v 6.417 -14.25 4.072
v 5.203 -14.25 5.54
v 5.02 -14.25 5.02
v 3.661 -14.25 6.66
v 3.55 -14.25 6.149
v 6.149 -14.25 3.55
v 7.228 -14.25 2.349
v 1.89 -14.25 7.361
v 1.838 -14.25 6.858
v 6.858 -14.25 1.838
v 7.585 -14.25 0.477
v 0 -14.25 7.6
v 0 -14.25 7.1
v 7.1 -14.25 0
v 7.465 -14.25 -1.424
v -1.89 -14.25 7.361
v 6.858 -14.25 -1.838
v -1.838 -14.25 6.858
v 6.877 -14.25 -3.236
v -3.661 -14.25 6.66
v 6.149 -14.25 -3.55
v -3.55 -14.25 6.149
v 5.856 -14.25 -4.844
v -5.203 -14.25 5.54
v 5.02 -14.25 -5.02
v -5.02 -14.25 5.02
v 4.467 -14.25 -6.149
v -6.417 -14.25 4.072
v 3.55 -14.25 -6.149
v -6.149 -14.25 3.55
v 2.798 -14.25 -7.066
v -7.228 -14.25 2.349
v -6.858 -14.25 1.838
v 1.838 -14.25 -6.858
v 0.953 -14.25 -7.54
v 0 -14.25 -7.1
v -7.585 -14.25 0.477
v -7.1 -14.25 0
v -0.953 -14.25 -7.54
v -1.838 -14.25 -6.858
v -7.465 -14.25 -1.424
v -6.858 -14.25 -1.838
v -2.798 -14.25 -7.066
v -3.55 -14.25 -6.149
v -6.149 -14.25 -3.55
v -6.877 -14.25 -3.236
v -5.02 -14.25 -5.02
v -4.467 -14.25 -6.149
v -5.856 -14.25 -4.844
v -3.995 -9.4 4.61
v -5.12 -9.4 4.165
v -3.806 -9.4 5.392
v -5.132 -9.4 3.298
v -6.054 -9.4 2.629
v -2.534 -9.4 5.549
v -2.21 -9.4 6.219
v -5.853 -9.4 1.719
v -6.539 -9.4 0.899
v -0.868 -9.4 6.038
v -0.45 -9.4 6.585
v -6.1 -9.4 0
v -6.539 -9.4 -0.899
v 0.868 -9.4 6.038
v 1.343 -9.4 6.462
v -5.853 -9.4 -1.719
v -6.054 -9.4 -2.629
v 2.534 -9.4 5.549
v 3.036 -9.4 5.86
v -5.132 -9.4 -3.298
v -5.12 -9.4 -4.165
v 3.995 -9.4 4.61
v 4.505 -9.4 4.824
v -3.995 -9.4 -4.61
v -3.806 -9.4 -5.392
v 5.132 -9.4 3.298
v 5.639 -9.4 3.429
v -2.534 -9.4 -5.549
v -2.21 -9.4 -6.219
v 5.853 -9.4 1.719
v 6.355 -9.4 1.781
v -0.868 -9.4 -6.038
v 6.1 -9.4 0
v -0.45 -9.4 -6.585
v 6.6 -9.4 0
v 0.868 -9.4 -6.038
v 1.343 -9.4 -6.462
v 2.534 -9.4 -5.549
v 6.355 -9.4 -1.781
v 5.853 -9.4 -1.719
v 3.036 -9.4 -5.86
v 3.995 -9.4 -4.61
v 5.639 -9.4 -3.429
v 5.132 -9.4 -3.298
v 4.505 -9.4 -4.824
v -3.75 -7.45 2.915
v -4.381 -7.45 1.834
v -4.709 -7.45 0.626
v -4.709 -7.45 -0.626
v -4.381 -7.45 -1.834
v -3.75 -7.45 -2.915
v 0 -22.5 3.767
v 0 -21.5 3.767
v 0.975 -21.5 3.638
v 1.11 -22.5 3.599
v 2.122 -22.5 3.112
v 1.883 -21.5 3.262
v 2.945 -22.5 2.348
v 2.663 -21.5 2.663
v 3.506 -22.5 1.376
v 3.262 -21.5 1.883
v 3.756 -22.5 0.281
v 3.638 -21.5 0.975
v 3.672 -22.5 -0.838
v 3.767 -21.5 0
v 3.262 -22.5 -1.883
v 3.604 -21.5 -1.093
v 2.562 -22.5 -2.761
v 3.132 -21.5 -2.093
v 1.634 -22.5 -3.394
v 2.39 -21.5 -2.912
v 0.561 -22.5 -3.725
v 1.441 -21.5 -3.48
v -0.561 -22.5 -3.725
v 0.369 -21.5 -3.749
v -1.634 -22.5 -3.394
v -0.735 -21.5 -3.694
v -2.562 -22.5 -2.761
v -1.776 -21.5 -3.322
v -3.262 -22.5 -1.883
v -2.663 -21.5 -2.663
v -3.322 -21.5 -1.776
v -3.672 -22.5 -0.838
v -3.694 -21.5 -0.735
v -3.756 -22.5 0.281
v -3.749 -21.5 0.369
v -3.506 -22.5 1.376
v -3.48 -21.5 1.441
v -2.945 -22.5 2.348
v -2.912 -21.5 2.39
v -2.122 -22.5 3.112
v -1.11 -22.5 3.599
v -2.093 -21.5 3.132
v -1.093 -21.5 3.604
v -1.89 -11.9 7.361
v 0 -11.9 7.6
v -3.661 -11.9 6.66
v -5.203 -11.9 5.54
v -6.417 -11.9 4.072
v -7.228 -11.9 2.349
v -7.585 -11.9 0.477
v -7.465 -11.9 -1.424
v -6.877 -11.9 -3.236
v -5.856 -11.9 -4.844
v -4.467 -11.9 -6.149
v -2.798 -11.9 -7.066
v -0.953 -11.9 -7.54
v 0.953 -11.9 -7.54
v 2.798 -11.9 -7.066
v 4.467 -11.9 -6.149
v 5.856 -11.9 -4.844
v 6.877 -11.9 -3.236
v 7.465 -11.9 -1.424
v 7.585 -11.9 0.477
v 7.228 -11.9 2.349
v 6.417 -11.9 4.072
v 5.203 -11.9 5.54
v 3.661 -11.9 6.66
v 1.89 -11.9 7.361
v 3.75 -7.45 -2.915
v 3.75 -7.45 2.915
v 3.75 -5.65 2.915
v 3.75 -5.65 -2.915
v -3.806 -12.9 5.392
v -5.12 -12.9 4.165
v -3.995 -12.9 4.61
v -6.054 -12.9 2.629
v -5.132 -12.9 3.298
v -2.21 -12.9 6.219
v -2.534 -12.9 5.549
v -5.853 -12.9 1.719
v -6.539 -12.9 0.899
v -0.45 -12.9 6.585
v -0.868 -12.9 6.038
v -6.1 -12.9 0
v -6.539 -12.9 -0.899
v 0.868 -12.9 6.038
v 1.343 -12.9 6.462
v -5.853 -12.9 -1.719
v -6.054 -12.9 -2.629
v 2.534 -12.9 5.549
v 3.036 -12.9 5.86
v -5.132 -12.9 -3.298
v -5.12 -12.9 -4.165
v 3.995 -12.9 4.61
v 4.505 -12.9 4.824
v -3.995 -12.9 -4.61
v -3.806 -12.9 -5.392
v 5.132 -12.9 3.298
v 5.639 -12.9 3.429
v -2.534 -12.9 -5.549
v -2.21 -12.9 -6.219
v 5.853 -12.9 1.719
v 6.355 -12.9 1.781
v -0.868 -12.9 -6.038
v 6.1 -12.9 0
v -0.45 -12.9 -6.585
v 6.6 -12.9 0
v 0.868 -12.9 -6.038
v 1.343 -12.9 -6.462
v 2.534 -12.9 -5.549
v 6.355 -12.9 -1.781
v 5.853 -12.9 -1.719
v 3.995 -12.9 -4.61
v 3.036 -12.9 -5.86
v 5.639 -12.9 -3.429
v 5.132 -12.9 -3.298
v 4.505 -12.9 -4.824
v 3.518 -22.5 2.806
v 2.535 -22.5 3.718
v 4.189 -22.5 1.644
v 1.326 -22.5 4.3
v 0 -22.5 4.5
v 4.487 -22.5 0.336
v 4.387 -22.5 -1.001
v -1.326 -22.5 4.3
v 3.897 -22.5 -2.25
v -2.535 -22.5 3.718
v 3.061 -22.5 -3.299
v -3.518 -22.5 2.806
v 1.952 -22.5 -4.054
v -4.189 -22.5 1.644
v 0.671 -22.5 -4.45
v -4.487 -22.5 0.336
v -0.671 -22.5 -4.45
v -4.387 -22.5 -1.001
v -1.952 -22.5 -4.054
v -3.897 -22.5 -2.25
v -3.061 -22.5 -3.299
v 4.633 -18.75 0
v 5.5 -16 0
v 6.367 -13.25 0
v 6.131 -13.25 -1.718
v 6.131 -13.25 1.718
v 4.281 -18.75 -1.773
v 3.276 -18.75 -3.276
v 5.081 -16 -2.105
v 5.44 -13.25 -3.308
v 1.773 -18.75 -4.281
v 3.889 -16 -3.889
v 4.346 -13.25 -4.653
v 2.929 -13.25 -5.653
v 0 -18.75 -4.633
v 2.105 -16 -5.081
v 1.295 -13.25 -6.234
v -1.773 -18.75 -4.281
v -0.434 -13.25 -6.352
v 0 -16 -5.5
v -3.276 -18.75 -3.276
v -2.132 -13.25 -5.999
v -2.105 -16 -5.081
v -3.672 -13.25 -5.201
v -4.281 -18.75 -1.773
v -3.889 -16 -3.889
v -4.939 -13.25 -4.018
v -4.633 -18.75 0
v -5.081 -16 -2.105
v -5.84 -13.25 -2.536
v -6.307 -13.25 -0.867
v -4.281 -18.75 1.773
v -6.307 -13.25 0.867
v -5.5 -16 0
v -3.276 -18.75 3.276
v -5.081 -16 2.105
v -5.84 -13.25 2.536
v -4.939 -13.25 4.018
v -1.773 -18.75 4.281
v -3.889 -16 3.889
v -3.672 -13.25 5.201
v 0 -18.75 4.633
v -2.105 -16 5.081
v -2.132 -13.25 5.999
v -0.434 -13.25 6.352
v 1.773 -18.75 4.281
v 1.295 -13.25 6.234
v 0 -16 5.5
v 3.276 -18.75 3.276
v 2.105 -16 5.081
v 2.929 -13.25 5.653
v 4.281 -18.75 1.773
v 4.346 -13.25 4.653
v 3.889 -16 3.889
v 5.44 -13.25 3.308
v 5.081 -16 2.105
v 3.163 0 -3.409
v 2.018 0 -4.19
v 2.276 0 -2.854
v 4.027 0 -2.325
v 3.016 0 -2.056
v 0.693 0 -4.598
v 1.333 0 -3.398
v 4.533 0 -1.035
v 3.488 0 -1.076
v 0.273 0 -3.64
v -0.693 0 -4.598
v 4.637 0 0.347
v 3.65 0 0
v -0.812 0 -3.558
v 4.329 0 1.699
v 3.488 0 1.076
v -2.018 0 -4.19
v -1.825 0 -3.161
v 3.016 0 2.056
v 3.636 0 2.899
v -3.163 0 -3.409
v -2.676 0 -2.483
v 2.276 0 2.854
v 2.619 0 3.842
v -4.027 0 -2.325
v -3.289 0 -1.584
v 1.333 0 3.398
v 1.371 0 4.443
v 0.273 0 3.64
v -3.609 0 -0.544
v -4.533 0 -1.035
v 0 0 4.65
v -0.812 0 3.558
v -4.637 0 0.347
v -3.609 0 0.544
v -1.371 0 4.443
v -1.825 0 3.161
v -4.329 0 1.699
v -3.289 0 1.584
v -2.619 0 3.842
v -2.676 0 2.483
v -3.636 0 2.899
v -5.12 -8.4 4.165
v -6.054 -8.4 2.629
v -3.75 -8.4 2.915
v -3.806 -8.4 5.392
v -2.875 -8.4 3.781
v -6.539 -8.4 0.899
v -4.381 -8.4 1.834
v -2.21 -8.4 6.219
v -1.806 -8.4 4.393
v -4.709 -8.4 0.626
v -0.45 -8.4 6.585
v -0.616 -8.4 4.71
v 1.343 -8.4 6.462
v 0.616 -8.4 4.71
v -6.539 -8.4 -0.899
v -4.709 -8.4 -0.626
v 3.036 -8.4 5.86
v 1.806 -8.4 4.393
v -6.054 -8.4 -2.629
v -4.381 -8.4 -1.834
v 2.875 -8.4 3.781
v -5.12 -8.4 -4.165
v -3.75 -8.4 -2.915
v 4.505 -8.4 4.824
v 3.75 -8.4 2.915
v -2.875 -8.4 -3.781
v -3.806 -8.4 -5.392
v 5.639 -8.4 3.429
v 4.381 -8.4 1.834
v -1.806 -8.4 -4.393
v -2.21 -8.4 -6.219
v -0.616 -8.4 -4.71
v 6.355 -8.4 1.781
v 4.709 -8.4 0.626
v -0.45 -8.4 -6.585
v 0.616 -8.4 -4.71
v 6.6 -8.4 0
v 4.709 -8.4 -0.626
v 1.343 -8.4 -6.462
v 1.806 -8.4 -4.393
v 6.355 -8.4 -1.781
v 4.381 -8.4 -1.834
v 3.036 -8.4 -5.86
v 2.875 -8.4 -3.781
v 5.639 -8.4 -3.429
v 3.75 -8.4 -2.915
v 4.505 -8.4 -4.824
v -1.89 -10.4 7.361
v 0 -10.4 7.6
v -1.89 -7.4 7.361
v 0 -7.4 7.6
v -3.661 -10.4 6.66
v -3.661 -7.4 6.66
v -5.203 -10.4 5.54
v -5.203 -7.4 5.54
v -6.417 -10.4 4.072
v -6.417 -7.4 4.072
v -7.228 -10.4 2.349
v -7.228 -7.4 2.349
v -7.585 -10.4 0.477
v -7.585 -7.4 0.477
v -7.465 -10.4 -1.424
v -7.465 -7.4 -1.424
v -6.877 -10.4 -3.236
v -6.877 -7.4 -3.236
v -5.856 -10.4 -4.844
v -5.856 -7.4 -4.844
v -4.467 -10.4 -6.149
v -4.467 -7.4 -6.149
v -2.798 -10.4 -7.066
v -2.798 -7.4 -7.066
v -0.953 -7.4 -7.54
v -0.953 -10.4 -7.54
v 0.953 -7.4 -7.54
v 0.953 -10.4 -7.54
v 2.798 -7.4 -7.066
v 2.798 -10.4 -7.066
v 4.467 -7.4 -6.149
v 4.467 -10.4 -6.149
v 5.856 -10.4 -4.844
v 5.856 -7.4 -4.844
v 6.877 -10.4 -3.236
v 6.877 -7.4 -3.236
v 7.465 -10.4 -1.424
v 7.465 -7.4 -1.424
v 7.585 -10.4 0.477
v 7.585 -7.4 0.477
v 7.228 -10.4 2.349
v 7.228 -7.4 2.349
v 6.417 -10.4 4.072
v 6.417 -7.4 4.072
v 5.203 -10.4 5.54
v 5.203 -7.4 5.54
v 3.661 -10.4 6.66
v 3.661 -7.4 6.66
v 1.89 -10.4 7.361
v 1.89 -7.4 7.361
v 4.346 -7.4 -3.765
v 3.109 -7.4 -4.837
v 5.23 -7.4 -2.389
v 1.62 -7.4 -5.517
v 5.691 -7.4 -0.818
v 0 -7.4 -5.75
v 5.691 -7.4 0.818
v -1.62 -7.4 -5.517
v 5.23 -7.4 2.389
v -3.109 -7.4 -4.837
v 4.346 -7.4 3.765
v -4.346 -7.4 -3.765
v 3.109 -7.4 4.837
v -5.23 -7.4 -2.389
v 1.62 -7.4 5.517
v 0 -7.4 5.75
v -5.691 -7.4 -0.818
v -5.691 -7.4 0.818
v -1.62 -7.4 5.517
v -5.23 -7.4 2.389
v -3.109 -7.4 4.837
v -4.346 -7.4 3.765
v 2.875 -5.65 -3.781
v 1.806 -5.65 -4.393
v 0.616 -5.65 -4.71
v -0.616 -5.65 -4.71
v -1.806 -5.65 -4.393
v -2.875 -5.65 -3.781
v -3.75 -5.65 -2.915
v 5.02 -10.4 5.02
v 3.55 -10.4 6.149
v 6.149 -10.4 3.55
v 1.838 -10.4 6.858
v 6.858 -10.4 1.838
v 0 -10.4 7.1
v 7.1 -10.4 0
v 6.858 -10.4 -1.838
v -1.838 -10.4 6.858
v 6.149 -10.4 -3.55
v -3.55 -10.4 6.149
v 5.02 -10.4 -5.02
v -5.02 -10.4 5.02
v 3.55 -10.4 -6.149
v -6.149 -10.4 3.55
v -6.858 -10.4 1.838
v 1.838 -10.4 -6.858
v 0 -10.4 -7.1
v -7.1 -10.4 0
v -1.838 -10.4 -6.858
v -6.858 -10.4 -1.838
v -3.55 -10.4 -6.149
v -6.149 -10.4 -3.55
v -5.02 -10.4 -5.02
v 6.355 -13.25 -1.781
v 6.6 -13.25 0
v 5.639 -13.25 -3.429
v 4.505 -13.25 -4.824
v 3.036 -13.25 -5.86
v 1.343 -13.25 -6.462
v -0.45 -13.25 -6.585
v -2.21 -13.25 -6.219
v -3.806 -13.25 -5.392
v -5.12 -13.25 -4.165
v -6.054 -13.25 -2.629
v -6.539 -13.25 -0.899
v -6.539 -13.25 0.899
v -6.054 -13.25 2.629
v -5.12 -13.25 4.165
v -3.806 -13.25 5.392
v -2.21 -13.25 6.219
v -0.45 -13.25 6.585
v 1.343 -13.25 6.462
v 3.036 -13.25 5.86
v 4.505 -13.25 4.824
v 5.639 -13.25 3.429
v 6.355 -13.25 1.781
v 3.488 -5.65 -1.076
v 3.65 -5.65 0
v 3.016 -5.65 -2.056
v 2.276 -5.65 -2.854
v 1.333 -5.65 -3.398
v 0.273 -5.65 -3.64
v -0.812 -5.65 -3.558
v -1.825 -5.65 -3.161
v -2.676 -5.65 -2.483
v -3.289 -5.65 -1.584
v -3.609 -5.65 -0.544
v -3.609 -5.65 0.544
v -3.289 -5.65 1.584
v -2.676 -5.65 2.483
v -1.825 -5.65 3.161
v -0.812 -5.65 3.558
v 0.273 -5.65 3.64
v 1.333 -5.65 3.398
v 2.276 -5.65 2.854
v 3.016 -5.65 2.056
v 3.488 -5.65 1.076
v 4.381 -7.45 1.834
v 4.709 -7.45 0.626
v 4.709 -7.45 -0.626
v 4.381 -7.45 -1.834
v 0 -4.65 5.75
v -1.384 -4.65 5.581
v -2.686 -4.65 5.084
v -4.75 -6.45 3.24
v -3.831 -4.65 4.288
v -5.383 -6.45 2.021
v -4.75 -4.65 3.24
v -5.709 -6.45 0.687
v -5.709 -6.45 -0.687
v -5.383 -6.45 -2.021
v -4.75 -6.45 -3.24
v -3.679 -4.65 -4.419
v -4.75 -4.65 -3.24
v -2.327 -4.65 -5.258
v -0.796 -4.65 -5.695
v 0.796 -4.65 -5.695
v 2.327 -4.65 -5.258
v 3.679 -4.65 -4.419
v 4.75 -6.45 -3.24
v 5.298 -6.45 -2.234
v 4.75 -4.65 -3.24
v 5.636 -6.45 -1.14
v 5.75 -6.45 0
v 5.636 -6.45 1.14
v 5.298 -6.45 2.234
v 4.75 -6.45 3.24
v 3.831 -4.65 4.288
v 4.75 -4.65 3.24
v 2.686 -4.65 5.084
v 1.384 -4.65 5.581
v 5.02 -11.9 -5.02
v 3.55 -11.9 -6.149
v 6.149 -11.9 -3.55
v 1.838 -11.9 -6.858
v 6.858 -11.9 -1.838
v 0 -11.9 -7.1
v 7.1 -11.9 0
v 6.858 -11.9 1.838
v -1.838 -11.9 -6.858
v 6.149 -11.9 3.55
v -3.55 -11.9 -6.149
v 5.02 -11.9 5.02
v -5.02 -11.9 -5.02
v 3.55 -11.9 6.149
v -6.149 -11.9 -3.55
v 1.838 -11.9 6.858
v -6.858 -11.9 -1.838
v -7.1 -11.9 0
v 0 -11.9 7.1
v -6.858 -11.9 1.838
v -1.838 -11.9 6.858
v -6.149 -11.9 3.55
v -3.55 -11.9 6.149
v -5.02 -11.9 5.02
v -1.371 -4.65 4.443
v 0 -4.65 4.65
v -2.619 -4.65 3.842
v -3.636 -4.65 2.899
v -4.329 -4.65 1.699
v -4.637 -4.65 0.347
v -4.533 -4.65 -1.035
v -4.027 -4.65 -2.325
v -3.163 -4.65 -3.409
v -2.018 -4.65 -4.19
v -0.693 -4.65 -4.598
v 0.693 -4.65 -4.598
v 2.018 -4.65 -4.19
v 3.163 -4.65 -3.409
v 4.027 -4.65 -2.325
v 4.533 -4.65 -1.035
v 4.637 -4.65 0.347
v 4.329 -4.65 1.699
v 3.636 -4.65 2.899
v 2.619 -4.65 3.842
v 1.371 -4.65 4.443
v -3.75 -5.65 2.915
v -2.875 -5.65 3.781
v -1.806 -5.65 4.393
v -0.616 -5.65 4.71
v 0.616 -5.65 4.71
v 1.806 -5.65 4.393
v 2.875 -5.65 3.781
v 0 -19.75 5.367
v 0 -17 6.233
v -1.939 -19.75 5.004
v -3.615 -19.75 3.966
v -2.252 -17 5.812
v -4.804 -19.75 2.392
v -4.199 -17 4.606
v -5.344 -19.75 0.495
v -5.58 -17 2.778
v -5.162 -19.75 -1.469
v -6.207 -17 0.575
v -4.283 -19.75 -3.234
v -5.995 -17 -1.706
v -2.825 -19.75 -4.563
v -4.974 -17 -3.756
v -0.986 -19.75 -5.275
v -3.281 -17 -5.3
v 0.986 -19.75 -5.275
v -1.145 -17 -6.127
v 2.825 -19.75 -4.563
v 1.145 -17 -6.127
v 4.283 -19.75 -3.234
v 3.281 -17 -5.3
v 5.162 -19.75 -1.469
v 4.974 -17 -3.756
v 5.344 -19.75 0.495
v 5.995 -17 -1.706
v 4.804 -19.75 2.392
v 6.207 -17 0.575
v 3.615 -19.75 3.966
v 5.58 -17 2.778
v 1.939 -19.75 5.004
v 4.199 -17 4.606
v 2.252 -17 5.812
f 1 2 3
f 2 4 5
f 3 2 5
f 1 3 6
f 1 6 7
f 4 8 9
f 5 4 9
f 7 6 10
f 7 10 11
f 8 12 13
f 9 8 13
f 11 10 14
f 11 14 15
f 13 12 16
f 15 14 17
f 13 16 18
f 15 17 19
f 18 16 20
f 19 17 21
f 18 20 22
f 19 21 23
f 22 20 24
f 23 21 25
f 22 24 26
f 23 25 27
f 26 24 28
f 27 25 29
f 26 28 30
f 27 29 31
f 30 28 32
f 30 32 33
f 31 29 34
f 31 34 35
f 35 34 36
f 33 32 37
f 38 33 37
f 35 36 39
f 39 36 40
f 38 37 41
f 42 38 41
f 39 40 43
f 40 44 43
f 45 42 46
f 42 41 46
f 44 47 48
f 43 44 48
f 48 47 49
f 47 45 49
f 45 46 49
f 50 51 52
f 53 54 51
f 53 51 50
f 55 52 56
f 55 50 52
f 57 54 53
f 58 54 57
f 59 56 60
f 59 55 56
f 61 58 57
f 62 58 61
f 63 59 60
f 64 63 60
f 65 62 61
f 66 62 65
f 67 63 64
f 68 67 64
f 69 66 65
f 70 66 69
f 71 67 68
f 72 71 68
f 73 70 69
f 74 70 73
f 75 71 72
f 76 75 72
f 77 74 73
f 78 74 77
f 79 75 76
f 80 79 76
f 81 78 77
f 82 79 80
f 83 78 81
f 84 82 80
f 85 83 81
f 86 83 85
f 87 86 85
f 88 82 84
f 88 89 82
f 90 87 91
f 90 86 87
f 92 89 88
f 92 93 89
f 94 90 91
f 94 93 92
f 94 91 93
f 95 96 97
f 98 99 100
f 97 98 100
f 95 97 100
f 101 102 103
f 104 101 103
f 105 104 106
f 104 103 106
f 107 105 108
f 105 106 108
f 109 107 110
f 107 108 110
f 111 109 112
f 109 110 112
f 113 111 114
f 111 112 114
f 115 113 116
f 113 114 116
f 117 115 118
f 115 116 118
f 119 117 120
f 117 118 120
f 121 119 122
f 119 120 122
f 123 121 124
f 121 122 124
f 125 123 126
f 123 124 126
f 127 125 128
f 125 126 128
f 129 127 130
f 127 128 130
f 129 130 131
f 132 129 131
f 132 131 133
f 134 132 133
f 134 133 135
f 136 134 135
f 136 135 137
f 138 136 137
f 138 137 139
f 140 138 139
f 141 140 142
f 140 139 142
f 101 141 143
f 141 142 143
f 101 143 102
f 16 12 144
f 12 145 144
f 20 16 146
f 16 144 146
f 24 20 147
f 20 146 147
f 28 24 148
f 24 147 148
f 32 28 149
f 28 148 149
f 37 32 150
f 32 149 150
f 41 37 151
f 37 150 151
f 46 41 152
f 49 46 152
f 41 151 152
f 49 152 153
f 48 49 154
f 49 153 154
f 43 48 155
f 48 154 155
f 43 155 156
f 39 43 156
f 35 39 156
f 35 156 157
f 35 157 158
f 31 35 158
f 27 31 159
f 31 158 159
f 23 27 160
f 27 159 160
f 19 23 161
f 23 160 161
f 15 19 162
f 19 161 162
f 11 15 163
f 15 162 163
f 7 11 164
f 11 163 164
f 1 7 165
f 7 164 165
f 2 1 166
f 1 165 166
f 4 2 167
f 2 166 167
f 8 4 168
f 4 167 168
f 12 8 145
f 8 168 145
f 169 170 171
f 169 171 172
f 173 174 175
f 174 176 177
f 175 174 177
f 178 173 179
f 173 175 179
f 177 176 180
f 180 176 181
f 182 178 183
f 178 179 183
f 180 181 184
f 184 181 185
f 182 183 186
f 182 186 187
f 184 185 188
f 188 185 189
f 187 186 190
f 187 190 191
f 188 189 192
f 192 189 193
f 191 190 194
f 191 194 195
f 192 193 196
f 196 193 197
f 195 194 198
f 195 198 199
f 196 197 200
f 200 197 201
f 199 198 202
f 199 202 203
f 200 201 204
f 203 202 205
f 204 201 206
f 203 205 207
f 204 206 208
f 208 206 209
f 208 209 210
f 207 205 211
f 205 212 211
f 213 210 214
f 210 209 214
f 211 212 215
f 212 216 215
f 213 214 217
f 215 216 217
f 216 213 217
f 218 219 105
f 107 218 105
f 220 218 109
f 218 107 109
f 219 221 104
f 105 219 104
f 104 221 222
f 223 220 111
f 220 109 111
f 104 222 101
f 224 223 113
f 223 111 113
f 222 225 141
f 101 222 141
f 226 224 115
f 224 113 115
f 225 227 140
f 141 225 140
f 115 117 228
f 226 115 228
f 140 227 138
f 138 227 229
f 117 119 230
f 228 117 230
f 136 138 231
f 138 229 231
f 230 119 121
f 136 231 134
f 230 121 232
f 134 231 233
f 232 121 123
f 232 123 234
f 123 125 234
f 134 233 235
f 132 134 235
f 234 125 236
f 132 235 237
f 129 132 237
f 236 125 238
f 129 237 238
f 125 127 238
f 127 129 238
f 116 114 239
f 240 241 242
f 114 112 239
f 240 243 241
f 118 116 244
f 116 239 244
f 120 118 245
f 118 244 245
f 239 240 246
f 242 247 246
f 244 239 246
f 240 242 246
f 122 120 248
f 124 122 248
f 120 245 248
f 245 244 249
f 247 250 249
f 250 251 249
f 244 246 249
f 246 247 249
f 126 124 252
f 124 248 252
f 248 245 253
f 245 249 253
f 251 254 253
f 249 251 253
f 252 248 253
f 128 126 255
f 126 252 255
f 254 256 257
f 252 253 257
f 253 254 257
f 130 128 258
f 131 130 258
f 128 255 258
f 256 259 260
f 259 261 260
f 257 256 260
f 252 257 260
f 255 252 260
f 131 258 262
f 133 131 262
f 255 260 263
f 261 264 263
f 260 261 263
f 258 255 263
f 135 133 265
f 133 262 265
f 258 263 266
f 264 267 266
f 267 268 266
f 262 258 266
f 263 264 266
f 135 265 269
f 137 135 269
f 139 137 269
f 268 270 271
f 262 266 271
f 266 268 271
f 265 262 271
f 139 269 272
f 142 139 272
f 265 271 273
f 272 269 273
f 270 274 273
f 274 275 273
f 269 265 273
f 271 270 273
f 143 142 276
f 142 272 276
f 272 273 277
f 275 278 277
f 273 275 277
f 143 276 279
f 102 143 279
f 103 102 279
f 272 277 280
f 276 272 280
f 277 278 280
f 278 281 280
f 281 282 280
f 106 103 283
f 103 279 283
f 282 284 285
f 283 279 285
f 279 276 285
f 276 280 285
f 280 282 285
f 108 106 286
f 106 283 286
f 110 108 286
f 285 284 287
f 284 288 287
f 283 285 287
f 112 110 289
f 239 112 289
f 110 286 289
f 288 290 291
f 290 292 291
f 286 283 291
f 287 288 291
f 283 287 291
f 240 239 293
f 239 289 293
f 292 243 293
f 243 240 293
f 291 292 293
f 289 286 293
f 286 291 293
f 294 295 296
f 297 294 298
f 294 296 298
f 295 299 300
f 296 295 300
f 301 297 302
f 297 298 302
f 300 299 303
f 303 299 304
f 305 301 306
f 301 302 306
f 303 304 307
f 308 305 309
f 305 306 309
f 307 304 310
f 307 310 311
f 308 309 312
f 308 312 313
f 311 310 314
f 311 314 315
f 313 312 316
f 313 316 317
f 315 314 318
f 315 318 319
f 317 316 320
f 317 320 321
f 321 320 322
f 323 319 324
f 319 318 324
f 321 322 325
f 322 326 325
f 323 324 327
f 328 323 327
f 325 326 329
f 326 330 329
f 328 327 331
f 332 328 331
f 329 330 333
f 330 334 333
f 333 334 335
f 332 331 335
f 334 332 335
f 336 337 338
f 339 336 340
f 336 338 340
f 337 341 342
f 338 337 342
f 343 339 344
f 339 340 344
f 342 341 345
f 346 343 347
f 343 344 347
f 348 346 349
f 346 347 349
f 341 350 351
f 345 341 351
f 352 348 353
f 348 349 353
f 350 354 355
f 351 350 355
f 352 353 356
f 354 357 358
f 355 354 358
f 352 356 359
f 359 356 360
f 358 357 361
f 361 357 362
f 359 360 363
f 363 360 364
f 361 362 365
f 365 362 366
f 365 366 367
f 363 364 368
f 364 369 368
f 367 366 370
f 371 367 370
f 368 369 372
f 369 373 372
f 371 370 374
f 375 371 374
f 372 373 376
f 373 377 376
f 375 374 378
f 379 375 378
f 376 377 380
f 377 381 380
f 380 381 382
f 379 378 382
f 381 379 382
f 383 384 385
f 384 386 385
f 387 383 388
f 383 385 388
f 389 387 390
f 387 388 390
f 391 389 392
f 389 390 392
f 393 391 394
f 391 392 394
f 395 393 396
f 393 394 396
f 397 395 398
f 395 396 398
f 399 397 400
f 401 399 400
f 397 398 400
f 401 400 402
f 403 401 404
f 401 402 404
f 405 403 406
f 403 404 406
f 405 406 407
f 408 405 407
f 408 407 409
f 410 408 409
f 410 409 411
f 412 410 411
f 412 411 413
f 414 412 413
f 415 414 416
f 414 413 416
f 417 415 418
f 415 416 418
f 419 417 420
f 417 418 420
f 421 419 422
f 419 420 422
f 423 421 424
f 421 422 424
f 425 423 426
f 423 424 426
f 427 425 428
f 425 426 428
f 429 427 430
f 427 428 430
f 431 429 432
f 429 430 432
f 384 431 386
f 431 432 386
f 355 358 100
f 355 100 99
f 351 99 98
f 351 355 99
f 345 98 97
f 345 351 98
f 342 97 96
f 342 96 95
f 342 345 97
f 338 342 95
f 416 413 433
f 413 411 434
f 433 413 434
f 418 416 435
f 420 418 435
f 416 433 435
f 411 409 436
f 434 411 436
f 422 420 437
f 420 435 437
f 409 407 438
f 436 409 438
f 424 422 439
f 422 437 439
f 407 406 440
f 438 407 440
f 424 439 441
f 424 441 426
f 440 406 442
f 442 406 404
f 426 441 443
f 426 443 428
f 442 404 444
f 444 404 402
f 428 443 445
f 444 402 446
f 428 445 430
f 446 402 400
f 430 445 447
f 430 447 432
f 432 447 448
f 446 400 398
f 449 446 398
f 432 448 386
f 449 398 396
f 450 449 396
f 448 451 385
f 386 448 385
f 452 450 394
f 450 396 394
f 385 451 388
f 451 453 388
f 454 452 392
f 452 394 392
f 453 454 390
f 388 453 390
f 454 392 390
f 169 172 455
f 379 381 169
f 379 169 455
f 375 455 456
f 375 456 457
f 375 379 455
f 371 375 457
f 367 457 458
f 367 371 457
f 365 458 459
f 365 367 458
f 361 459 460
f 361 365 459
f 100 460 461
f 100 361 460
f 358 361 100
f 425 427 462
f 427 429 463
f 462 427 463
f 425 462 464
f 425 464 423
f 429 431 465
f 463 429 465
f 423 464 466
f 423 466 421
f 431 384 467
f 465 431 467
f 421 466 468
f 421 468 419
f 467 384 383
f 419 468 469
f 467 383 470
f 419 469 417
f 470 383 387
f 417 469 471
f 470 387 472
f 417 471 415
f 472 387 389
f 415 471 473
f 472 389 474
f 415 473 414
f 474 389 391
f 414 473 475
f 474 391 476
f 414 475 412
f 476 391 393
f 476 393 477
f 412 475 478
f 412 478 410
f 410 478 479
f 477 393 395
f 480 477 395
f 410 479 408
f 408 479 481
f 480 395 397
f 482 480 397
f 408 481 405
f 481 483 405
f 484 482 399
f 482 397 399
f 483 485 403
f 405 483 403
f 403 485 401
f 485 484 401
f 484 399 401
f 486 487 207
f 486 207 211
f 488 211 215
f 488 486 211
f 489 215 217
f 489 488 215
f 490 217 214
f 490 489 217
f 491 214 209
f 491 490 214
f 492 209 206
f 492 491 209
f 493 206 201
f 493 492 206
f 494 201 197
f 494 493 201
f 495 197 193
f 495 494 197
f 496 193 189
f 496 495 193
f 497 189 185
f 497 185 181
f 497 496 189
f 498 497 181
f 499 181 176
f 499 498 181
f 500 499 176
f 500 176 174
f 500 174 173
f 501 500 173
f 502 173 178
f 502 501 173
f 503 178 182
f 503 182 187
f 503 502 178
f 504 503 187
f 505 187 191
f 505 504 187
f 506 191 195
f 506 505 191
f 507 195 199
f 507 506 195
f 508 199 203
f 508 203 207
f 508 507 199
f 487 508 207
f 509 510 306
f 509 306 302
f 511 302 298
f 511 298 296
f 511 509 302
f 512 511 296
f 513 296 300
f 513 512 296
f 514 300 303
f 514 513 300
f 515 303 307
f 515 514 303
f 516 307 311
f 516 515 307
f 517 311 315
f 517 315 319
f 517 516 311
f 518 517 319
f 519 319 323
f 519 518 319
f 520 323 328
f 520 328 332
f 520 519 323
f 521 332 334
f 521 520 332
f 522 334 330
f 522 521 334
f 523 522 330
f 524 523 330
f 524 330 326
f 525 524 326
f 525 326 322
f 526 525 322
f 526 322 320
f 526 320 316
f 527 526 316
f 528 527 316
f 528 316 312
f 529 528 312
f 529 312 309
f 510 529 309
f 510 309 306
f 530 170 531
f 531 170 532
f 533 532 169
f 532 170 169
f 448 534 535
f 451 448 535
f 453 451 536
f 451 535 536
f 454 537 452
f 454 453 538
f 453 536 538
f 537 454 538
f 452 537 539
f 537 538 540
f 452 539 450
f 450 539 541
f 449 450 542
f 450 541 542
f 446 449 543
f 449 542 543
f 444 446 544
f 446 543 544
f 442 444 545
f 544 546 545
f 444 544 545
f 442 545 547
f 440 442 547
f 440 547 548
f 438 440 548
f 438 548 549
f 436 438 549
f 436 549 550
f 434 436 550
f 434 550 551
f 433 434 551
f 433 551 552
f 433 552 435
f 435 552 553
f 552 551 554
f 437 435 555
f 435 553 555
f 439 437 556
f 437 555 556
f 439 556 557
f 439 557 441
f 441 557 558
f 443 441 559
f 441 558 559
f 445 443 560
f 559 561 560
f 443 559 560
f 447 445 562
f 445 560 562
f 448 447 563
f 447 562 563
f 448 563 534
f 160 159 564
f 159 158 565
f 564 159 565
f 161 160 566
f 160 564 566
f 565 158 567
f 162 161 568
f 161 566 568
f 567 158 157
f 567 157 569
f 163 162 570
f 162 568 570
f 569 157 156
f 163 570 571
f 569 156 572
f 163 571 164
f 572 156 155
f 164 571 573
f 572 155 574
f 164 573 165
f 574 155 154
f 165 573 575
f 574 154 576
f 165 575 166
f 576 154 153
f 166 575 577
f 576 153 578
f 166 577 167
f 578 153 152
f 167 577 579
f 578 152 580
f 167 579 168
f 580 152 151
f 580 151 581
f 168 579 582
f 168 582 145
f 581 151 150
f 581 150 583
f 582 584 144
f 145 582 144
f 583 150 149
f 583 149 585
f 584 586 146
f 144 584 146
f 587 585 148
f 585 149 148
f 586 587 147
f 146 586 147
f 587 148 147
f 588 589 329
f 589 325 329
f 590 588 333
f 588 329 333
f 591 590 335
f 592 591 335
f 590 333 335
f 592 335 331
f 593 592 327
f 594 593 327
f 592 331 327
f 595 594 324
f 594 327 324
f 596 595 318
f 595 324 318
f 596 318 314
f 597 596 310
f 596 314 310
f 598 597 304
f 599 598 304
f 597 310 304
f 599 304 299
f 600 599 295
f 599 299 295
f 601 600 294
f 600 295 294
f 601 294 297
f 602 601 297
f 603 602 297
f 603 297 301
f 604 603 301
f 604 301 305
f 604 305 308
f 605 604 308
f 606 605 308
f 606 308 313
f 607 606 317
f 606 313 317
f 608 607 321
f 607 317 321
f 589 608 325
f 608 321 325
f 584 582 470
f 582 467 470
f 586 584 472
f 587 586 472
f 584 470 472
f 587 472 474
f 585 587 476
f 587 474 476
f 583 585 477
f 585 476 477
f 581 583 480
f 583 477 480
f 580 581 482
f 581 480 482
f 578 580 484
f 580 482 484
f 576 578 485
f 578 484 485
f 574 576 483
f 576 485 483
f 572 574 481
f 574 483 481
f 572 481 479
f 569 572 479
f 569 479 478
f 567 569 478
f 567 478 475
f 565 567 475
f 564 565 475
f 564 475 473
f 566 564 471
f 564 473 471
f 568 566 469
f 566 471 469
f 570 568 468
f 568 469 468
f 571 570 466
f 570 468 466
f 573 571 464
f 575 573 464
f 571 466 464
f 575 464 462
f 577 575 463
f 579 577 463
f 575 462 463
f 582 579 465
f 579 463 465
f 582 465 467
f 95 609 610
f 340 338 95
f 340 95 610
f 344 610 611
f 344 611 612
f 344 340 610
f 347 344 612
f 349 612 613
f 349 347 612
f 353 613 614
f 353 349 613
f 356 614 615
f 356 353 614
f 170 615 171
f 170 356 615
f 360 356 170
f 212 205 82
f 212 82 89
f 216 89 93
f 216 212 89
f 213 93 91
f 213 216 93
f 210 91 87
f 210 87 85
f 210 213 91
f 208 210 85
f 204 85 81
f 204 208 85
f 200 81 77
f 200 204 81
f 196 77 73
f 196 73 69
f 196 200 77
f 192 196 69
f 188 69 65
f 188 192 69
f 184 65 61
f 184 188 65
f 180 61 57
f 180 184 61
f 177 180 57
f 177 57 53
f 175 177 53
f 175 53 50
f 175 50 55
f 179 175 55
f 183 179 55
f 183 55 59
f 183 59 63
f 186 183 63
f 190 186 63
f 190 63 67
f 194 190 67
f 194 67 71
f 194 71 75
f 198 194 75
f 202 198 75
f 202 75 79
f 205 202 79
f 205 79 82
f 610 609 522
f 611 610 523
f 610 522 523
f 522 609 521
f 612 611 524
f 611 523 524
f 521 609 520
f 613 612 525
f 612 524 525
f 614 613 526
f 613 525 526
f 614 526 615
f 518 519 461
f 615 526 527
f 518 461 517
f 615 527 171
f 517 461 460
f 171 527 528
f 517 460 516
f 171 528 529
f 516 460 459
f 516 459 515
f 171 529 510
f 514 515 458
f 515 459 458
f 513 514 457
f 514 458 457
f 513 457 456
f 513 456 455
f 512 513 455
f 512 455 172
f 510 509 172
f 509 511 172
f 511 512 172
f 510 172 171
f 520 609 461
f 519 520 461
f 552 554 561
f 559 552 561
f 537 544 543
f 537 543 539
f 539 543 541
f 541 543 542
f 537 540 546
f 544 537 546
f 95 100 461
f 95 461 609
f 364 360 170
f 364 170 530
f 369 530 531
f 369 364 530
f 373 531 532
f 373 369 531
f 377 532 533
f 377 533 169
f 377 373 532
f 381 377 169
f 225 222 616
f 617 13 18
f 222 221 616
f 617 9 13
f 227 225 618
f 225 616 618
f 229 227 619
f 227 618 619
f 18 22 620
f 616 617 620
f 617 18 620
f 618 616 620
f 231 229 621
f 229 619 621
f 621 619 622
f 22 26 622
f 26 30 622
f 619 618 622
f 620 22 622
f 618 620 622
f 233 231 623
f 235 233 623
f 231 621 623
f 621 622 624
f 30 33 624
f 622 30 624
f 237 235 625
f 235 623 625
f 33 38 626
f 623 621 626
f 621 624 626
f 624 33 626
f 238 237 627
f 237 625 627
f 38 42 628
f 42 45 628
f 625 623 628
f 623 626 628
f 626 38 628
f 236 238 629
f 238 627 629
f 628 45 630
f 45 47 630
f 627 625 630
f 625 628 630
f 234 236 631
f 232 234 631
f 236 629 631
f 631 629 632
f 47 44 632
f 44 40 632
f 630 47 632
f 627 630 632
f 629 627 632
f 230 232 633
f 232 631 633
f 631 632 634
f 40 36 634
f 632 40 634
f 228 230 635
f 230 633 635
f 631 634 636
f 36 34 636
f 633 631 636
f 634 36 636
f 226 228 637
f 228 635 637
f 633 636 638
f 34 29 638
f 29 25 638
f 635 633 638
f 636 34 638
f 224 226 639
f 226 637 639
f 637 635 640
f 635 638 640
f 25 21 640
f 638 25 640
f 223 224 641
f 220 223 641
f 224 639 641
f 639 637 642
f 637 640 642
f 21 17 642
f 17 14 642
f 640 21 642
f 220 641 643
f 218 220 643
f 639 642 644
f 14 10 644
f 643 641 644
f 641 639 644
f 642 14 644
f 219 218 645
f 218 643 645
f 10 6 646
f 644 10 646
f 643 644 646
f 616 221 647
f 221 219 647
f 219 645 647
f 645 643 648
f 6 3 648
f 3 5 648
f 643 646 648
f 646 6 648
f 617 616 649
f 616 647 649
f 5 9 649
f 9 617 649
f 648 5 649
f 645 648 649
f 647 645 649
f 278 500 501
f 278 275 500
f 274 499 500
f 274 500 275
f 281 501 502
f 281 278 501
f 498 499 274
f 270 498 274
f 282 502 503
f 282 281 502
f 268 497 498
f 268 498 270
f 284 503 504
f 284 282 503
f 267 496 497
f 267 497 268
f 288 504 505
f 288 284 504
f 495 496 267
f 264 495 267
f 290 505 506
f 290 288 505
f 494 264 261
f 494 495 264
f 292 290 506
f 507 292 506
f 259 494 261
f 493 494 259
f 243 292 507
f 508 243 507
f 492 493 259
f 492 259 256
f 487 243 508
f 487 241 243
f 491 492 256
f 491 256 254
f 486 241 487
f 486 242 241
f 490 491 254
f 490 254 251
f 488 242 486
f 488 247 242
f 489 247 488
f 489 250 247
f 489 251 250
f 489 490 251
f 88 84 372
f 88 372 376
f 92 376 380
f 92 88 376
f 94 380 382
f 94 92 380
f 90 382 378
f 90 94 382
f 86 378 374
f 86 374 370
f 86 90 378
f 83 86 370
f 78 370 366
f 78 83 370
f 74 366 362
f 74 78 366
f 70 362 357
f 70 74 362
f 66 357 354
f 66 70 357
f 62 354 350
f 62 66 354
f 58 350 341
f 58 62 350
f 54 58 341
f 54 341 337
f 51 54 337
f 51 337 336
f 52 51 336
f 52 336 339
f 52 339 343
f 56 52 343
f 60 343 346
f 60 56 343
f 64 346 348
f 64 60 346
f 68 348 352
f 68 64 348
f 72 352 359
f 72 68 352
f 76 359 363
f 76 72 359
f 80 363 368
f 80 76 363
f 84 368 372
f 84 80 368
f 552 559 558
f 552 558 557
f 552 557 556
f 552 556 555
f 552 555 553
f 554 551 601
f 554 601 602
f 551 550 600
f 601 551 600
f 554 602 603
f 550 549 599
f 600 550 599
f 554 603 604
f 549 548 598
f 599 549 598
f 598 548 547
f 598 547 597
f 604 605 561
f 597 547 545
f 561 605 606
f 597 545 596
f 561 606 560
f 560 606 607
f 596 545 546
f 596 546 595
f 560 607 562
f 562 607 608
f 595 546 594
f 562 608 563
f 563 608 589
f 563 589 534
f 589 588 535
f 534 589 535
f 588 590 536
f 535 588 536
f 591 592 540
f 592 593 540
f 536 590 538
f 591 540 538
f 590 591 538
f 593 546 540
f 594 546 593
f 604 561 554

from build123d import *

# Parameters (mm, degrees)
CUT_EXTRUDE1_DEPTH   = 1.8
SHELL1_START         = -21.5
SHELL1_OUTLINE_R     = 3.65
SHELL1_DEPTH         = 21.5
SHELL1_START_2       = -13.25
SHELL1_2_OUTLINE_R   = 6.1
SHELL1_2_OUTLINE_R_2 = 3.65
SHELL1_2_DEPTH       = 4.85
SHELL1_START_3       = -8.4
SHELL1_3_OUTLINE_R   = 3.65
SHELL1_3_DEPTH       = 2.75
SHELL1_START_4       = -9.4
SHELL1_4_OUTLINE_R   = 6.6
SHELL1_4_OUTLINE_R_2 = 6.1
SHELL1_4_DEPTH       = 1
SHELL1_5_DEPTH       = 0.95
SHELL1_6_OUTLINE_R   = 6.6
SHELL1_6_OUTLINE_R_2 = 6.1
SHELL1_6_DEPTH       = 0.35
SKETCH3_R            = 3.766666667
CUT_EXTRUDE2_DEPTH   = 6.8


with BuildPart() as part:
    # Sketch1 → Revolve1 (revolve)
    with BuildSketch(Plane.XY, mode=Mode.PRIVATE) as revolve1_sk:
        Polygon((0, 0), (0, -22.5), (4.5, -22.5), (7.1, -14.25), (7.6, -14.25), (7.6, -11.9), (7.1, -11.9), (7.1, -10.4), (7.6, -10.4), (7.6, -7.4), (5.75, -7.4), (5.75, -4.65), (4.65, -4.65), (4.65, 0), align=None)
    revolve(revolve1_sk.sketch.rotate(Axis((0, 0, 0), (0, -1, 0)), 90), axis=Axis((0, 0, 0), (0, -1, 0)))

    # Sketch2 → Cut-Extrude1 (cut)
    with BuildSketch(Plane(origin=(0, -4.65, 0), x_dir=(1, 0, 0), z_dir=(0, 1, 0))):
        with BuildLine():
            Line((-4.75, -3.240370349), (-4.75, 3.240370349))
            ThreePointArc((-4.75, 3.240370349), (-5.75, 0), (-4.75, -3.240370349))
        make_face()
        with BuildLine():
            ThreePointArc((5.75, 0), (5.494315244, 1.695582496), (4.75, 3.240370349))
            Line((4.75, 3.240370349), (4.75, -3.240370349))
            ThreePointArc((4.75, -3.240370349), (5.494315244, -1.695582496), (5.75, 0))
        make_face()
    extrude(amount=-CUT_EXTRUDE1_DEPTH, mode=Mode.SUBTRACT)

    # Shell1: read off the stored shape, not the designer's step
    # Shell1 outline → Shell1 (cut)
    with BuildSketch(Plane(origin=(0, 0, 0), x_dir=(1, 0, 0), z_dir=(0, 1, 0)).offset(SHELL1_START)):
        Circle(SHELL1_OUTLINE_R)
    extrude(amount=SHELL1_DEPTH, mode=Mode.SUBTRACT)

    # Shell1 2 outline → Shell1 2 (cut)
    with BuildSketch(Plane(origin=(0, 0, 0), x_dir=(1, 0, 0), z_dir=(0, 1, 0)).offset(SHELL1_START_2)):
        Circle(SHELL1_2_OUTLINE_R)
        Circle(SHELL1_2_OUTLINE_R_2, mode=Mode.SUBTRACT)
    extrude(amount=SHELL1_2_DEPTH, mode=Mode.SUBTRACT)

    # Shell1 3 outline → Shell1 3 (cut)
    with BuildSketch(Plane(origin=(0, 0, 0), x_dir=(1, 0, 0), z_dir=(0, 1, 0)).offset(SHELL1_START_3)):
        with BuildLine():
            Line((3.75, -2.915475947), (3.75, 2.915475947))
            ThreePointArc((3.75, 2.915475947), (0, 4.75), (-3.75, 2.915475947))
            Line((-3.75, 2.915475947), (-3.75, -2.915475947))
            ThreePointArc((-3.75, -2.915475947), (0, -4.75), (3.75, -2.915475947))
        make_face()
        Circle(SHELL1_3_OUTLINE_R, mode=Mode.SUBTRACT)
    extrude(amount=SHELL1_3_DEPTH, mode=Mode.SUBTRACT)

    # Shell1 4 outline → Shell1 4 (cut)
    with BuildSketch(Plane(origin=(0, 0, 0), x_dir=(1, 0, 0), z_dir=(0, 1, 0)).offset(SHELL1_START_4)):
        Circle(SHELL1_4_OUTLINE_R)
        Circle(SHELL1_4_OUTLINE_R_2, mode=Mode.SUBTRACT)
    extrude(amount=SHELL1_4_DEPTH, mode=Mode.SUBTRACT)

    # Shell1 5 outline → Shell1 5 (cut)
    with BuildSketch(Plane(origin=(0, 0, 0), x_dir=(1, 0, 0), z_dir=(0, 1, 0)).offset(SHELL1_START_3)):
        with BuildLine():
            ThreePointArc((3.75, -2.915475947), (4.75, 0), (3.75, 2.915475947))
            Line((3.75, 2.915475947), (3.75, -2.915475947))
        make_face()
        with BuildLine():
            Line((-3.75, -2.915475947), (-3.75, 2.915475947))
            ThreePointArc((-3.75, 2.915475947), (-4.75, 0), (-3.75, -2.915475947))
        make_face()
    extrude(amount=SHELL1_5_DEPTH, mode=Mode.SUBTRACT)

    # Shell1 6 outline → Shell1 6 (cut)
    with BuildSketch(Plane(origin=(0, 0, 0), x_dir=(1, 0, 0), z_dir=(0, 1, 0)).offset(SHELL1_START_2)):
        Circle(SHELL1_6_OUTLINE_R)
        Circle(SHELL1_6_OUTLINE_R_2, mode=Mode.SUBTRACT)
    extrude(amount=SHELL1_6_DEPTH, mode=Mode.SUBTRACT)

    # Shell1 7 outline → Shell1 7 (revolve, cut)
    with BuildSketch(Plane.XY):
        Polygon((6.366666667, -13.25), (3.65, -13.25), (3.65, -21.5), (3.766666667, -21.5), align=None)
    revolve(axis=Axis((0, 0, 0), (0, 1, 0)), mode=Mode.SUBTRACT)

    # Sketch3 → Cut-Extrude2 (cut)
    with BuildSketch(Plane(origin=(0, -21.5, 0), x_dir=(1, 0, 0), z_dir=(0, 1, 0))):
        with Locations(Location((0, 0, 0), (0, 0, 270))):
            Circle(SKETCH3_R)
    extrude(amount=-CUT_EXTRUDE2_DEPTH, mode=Mode.SUBTRACT)


solid = part.part
